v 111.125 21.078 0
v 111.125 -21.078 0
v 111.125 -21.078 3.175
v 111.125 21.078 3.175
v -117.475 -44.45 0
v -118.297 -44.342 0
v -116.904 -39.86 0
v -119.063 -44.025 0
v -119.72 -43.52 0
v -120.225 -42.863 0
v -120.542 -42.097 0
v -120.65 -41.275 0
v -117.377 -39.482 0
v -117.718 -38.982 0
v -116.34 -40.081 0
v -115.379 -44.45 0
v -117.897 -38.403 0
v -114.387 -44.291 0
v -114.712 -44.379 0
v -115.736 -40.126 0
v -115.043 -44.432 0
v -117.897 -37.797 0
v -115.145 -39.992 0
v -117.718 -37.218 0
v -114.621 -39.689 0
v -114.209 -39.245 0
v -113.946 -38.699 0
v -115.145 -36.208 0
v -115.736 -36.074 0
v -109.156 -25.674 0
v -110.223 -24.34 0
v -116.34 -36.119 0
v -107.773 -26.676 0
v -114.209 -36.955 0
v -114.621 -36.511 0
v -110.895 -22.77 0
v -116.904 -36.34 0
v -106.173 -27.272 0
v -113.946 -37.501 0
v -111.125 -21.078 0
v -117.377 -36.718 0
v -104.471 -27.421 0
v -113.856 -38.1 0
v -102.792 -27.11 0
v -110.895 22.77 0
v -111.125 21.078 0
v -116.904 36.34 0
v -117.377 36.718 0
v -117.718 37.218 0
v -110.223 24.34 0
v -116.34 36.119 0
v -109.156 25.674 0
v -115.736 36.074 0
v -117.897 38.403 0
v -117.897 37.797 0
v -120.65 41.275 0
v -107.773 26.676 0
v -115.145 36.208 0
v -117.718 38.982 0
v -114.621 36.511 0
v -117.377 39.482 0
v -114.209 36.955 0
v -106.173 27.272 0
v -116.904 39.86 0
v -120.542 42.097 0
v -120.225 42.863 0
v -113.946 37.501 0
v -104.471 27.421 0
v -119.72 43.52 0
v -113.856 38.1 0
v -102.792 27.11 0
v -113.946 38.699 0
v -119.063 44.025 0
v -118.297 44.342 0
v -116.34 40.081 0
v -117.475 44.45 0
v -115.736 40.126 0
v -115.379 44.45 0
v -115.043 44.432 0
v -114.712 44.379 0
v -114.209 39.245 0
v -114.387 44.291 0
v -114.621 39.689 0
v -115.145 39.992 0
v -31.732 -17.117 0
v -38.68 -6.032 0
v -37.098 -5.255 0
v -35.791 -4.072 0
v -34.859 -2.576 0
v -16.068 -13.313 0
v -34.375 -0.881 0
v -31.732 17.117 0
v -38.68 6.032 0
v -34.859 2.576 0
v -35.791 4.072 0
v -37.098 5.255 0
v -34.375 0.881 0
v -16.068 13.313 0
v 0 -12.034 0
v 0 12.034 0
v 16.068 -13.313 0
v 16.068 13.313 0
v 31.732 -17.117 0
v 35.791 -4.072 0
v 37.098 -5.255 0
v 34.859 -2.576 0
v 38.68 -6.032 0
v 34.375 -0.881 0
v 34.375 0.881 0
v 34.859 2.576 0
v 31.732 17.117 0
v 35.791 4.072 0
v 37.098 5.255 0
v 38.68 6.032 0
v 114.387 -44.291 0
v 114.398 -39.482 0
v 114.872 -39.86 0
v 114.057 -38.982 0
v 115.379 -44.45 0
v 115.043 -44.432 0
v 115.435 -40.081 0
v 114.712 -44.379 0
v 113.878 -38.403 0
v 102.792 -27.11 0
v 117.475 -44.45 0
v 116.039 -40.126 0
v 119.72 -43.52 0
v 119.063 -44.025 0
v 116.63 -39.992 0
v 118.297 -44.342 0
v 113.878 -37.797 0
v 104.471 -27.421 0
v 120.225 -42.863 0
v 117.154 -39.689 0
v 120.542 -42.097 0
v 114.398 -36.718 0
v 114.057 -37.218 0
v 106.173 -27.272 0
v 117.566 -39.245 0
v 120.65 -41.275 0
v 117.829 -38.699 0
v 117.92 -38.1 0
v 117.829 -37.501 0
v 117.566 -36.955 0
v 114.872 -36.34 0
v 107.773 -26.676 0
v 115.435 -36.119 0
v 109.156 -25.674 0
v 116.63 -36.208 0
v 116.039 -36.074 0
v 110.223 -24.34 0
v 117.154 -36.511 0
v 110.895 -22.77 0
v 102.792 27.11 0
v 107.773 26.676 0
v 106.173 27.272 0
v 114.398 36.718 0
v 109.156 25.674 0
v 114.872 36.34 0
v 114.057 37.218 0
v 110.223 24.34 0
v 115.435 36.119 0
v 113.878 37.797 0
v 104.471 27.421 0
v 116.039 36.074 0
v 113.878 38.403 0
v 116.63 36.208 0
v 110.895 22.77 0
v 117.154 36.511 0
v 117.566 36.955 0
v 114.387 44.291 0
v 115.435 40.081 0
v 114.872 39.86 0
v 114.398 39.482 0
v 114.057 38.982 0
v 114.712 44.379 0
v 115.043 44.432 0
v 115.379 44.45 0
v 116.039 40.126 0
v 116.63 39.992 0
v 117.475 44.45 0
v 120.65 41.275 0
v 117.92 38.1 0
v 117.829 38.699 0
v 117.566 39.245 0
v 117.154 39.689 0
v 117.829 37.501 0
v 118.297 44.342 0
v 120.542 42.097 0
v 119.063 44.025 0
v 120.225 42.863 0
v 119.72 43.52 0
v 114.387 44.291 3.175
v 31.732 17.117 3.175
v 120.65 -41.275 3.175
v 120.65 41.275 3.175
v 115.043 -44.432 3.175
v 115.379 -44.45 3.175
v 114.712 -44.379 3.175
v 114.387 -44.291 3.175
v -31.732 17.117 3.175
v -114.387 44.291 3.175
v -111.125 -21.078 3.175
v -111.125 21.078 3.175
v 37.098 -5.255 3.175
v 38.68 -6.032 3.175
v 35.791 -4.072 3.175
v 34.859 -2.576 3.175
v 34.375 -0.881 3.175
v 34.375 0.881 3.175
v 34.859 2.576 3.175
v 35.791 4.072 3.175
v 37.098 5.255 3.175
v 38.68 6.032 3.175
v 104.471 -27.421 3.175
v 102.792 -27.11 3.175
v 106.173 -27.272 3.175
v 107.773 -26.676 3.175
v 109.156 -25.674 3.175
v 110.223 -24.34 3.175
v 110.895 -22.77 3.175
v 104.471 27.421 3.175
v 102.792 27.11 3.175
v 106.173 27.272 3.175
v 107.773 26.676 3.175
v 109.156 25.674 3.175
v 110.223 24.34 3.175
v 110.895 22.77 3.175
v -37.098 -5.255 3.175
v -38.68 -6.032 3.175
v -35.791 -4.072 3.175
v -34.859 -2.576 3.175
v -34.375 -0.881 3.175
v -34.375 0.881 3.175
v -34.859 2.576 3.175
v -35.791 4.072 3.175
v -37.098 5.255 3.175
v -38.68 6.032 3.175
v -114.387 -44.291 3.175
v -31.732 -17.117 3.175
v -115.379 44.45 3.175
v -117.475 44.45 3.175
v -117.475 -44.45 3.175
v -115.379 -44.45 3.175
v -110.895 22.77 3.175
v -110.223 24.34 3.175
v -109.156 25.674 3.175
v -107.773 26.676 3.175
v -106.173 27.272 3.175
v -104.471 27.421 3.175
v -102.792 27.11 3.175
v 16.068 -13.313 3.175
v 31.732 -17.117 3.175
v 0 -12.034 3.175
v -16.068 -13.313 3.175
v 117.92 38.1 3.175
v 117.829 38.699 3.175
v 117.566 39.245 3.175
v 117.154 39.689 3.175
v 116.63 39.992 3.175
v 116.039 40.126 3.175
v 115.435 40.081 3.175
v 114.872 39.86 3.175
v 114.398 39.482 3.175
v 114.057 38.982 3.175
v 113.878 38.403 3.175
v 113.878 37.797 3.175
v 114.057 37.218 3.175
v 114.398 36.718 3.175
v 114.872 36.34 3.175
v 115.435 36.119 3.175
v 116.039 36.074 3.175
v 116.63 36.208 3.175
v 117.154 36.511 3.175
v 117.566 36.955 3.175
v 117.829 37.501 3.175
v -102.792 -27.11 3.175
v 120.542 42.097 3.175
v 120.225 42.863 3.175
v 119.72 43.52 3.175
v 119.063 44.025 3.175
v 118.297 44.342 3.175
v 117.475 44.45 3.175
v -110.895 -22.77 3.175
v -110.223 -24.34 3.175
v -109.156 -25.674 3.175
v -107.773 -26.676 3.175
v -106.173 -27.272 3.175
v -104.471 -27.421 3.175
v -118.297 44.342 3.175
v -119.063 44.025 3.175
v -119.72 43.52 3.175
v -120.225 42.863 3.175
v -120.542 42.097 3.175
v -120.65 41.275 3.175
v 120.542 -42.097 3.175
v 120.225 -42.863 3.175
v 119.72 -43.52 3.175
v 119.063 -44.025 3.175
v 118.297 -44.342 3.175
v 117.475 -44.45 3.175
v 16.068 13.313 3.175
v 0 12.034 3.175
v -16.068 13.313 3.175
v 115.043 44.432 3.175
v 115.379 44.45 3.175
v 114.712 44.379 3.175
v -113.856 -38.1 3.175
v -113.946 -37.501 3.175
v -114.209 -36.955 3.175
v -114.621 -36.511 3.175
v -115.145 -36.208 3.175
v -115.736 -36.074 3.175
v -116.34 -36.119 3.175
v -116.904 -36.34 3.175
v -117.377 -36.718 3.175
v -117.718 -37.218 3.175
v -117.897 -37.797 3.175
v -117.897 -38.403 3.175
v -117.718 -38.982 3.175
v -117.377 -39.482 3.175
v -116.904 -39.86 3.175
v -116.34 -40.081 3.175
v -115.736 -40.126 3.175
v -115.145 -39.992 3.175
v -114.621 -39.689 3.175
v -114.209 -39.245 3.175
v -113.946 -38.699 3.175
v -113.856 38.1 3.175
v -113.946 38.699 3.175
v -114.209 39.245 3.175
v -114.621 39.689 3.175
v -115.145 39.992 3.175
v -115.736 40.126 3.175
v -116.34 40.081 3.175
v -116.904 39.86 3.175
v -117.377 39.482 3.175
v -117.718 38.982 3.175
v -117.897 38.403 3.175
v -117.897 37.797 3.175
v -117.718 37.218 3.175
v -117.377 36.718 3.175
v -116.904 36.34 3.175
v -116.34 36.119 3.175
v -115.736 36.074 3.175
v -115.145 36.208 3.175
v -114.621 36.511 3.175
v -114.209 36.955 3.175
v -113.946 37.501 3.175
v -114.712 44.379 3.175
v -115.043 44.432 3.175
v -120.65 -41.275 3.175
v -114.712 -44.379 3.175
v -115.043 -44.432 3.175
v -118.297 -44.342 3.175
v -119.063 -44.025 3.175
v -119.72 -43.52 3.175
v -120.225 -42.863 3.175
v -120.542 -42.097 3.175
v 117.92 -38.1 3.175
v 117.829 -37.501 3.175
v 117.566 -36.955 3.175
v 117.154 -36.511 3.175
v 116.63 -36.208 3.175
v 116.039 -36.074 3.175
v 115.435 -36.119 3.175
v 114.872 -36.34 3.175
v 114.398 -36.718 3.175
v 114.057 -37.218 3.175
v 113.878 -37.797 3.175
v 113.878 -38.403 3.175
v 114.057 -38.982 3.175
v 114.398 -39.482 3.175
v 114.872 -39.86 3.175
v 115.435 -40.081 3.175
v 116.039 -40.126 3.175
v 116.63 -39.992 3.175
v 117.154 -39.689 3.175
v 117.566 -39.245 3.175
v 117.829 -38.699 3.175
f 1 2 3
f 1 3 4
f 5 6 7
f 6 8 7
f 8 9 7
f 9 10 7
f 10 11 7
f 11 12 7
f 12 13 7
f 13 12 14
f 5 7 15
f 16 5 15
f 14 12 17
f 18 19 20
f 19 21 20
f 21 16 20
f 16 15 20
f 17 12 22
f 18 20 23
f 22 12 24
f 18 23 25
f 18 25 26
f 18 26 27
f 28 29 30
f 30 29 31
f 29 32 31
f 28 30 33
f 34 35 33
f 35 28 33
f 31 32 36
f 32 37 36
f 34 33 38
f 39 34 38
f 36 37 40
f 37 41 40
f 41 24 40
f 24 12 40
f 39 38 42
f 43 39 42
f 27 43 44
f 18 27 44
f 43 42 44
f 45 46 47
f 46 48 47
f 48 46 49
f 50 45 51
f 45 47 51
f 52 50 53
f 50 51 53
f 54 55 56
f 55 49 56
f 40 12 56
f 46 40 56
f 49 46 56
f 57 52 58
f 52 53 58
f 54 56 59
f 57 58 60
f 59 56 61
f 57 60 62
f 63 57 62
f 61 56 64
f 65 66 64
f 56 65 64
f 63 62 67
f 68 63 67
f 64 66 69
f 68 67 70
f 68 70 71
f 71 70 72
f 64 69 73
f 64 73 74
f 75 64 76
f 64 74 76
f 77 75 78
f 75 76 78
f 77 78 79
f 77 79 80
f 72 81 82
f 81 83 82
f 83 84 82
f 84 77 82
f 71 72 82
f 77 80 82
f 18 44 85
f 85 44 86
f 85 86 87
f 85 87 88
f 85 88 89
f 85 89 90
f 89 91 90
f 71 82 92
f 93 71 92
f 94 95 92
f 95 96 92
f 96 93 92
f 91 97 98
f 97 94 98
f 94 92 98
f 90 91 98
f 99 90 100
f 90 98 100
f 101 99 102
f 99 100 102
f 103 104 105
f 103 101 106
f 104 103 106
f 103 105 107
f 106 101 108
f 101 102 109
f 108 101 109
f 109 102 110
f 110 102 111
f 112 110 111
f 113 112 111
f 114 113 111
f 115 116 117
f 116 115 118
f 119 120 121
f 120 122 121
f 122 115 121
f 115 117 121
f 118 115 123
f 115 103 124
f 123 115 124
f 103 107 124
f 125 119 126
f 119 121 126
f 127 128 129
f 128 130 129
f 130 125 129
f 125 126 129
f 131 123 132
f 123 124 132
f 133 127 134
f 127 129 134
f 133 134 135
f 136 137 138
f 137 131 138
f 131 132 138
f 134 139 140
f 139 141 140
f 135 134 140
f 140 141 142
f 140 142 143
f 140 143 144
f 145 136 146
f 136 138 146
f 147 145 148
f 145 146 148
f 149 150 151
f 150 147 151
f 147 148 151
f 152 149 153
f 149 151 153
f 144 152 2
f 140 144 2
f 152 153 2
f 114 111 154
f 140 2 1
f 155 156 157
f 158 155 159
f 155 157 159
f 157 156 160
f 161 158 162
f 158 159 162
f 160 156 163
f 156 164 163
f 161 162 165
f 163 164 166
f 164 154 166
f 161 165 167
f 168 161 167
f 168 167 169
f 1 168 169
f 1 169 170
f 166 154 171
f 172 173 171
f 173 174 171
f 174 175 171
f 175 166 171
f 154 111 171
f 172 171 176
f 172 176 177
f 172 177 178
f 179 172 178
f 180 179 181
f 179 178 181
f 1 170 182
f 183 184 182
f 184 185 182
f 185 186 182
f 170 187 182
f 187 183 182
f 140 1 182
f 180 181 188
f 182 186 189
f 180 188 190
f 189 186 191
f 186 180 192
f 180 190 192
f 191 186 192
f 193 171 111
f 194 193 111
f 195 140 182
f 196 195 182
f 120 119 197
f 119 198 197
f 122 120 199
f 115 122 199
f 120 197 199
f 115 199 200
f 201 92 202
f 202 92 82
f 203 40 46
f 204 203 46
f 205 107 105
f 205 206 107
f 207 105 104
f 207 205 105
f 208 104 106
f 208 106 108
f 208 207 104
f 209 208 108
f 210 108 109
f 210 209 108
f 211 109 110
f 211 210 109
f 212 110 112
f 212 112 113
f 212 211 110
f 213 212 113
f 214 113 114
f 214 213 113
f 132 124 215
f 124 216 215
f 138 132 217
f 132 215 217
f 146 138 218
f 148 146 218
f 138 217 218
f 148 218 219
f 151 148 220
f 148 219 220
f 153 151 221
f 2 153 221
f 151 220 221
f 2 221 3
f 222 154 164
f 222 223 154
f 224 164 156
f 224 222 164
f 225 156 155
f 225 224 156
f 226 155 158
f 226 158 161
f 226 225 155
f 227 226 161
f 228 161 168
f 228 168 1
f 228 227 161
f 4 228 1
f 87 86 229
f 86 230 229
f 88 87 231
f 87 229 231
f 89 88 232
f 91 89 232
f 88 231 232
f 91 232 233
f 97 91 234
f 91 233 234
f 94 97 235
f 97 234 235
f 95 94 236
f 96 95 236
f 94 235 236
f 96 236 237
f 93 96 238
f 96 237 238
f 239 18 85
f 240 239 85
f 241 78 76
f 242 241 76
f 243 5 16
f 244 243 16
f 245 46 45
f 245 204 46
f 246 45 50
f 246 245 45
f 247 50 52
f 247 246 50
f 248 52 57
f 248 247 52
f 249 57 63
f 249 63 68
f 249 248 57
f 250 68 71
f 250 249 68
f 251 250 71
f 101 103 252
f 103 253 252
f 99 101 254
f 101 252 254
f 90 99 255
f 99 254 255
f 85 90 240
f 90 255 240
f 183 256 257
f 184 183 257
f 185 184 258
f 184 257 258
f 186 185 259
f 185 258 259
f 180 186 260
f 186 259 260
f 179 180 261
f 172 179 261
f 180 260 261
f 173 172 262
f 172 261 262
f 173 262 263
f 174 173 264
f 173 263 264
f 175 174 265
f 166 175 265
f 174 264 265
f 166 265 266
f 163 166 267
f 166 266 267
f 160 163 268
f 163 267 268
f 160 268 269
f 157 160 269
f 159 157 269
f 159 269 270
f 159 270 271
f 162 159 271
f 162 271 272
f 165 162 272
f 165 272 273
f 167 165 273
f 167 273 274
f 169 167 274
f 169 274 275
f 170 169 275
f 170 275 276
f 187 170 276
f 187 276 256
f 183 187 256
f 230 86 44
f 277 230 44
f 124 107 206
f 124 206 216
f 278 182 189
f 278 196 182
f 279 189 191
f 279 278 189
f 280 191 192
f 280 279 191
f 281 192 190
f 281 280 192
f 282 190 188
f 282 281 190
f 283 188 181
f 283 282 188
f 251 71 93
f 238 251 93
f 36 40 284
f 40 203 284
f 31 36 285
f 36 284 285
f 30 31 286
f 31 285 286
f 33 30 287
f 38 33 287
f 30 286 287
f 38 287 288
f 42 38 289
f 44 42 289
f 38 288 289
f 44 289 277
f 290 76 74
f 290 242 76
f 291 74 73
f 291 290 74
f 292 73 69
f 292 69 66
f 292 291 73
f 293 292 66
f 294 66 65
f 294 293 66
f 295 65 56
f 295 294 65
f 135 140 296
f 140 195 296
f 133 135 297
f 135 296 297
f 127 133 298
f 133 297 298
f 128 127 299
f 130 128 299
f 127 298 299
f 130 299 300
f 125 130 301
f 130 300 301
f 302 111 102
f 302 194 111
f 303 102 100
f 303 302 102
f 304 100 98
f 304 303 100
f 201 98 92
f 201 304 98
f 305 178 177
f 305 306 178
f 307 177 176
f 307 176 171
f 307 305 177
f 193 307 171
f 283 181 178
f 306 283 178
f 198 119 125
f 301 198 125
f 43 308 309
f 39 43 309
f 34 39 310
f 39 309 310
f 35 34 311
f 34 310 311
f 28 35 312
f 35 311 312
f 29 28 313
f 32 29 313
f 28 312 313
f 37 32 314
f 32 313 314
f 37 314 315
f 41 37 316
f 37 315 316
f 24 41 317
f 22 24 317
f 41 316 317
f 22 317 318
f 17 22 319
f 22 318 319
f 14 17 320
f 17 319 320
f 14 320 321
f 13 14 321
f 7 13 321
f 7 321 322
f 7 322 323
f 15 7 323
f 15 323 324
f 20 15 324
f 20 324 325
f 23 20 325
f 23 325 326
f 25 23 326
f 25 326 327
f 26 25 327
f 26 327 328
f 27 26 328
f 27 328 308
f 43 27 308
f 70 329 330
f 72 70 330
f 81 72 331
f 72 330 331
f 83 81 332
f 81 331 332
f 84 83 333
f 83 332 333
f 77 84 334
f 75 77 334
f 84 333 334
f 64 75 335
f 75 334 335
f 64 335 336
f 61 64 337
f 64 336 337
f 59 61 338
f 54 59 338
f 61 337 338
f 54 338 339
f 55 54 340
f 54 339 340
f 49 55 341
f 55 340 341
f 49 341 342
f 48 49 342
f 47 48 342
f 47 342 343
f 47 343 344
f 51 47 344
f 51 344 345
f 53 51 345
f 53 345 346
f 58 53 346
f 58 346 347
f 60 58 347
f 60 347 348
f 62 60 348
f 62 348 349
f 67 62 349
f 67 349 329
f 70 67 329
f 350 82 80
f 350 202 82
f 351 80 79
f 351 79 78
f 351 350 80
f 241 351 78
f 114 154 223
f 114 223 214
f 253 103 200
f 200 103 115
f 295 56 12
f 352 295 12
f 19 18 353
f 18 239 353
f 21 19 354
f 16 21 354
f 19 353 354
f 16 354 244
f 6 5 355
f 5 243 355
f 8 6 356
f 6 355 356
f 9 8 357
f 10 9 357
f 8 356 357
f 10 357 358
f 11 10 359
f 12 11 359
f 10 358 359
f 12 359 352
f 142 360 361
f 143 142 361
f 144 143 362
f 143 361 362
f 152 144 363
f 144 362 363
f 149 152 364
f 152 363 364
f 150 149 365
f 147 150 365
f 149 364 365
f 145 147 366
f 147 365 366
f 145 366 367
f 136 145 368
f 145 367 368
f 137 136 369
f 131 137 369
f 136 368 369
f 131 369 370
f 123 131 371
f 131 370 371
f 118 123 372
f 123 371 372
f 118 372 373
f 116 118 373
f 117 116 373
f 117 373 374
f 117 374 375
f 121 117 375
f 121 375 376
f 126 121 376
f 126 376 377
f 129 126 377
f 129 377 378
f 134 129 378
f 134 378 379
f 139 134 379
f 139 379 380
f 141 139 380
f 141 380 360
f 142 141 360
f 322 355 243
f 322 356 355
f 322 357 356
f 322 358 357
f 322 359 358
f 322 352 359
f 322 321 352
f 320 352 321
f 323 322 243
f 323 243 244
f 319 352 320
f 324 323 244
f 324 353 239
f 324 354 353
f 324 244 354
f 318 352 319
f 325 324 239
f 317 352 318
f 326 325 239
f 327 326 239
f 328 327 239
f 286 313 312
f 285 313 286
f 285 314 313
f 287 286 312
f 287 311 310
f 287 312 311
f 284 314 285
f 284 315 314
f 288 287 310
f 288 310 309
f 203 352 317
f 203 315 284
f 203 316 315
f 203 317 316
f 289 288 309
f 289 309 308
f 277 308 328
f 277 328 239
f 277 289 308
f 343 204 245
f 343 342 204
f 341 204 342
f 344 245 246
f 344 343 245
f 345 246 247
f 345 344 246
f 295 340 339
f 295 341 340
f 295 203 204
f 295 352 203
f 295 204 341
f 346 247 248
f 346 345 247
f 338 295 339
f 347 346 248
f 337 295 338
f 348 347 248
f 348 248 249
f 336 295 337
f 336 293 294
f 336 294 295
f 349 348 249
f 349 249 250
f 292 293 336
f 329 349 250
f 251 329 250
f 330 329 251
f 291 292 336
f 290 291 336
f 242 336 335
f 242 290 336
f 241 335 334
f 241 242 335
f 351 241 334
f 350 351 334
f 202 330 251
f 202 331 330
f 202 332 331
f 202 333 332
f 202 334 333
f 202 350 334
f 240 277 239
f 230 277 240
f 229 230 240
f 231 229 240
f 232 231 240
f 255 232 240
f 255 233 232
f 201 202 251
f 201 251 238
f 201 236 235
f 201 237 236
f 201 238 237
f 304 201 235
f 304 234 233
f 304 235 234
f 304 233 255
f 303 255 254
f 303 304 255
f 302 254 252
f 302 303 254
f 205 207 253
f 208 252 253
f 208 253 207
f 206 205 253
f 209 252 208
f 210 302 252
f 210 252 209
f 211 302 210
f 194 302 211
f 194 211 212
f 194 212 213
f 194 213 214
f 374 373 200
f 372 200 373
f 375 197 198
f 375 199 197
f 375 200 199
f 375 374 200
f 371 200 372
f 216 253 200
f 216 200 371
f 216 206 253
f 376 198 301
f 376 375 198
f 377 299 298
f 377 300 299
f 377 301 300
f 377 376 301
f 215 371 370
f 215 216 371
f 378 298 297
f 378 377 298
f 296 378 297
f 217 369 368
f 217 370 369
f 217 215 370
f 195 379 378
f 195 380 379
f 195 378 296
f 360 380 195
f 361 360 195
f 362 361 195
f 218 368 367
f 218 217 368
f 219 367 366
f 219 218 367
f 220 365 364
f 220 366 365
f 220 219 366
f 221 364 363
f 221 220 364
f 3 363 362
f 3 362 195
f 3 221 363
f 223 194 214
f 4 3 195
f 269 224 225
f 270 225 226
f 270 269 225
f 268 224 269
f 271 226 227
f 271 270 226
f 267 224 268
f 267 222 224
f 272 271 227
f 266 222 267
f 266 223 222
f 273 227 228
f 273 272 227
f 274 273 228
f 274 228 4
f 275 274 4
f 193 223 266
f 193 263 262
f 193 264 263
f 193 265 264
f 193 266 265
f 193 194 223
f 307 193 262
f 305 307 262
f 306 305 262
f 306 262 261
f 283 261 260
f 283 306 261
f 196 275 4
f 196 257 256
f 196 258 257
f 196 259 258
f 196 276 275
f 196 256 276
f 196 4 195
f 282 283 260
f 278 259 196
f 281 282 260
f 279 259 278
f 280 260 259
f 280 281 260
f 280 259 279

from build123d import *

# Parameters (mm, degrees)
BOSS_EXTRUDE1_DEPTH = 3.175
SKETCH3_R           = 2.032
CUT_EXTRUDE1_DEPTH  = 129.616894788
FILLET1_R           = 3.175
FILLET2_R           = 101.6
FILLET3_R           = 6.35


with BuildPart() as part:
    # Sketch2 → Boss-Extrude1 (new body)
    with BuildSketch(Plane.XY):
        Polygon((120.65, -44.45), (120.65, 44.45), (114.870442245, 44.45), (0, 6.684375152), (-114.870442245, 44.45), (-120.65, 44.45), (-120.65, -44.45), (-114.870442245, -44.45), (0, -6.684375152), (114.870442245, -44.45), align=None)
        Polygon((-111.125, 29.849871423), (-20.331641088, 0), (-111.125, -29.849871423), align=None, mode=Mode.SUBTRACT)
        Polygon((20.331641088, 0), (111.125, -29.849871423), (111.125, 29.849871423), align=None, mode=Mode.SUBTRACT)
    extrude(amount=BOSS_EXTRUDE1_DEPTH)

    # Sketch3 → Cut-Extrude1 (cut, through all)
    with BuildSketch(Plane.XY.offset(3.175)):
        with Locations((-115.8875, 38.1)):
            Circle(SKETCH3_R)
        with Locations((-115.8875, -38.1)):
            Circle(SKETCH3_R)
        with Locations((115.8875, 38.1)):
            Circle(SKETCH3_R)
        with Locations((115.8875, -38.1)):
            Circle(SKETCH3_R)
    extrude(amount=-CUT_EXTRUDE1_DEPTH, mode=Mode.SUBTRACT)

    # Fillet1
    fillet1_edges = [part.edges().sort_by_distance(p)[0] for p in [
        (114.870442245, -44.45, 1.5875),
        (-114.870442245, -44.45, 1.5875),
        (-120.65, -44.45, 1.5875),
        (-120.65, 44.45, 1.5875),
        (-114.870442245, 44.45, 1.5875),
        (114.870442245, 44.45, 1.5875),
        (120.65, 44.45, 1.5875),
        (120.65, -44.45, 1.5875),
    ]]
    fillet(fillet1_edges, radius=FILLET1_R)

    # Fillet2
    fillet2_edges = [part.edges().sort_by_distance(p)[0] for p in [
        (0, -6.684375152, 1.5875),
        (0, 6.684375152, 1.5875),
    ]]
    fillet(fillet2_edges, radius=FILLET2_R)

    # Fillet3
    fillet3_edges = [part.edges().sort_by_distance(p)[0] for p in [
        (-111.125, -29.849871423, 1.5875),
        (-20.331641088, 0, 1.5875),
        (-111.125, 29.849871423, 1.5875),
        (111.125, -29.849871423, 1.5875),
        (111.125, 29.849871423, 1.5875),
        (20.331641088, 0, 1.5875),
    ]]
    fillet(fillet3_edges, radius=FILLET3_R)


solid = part.part
